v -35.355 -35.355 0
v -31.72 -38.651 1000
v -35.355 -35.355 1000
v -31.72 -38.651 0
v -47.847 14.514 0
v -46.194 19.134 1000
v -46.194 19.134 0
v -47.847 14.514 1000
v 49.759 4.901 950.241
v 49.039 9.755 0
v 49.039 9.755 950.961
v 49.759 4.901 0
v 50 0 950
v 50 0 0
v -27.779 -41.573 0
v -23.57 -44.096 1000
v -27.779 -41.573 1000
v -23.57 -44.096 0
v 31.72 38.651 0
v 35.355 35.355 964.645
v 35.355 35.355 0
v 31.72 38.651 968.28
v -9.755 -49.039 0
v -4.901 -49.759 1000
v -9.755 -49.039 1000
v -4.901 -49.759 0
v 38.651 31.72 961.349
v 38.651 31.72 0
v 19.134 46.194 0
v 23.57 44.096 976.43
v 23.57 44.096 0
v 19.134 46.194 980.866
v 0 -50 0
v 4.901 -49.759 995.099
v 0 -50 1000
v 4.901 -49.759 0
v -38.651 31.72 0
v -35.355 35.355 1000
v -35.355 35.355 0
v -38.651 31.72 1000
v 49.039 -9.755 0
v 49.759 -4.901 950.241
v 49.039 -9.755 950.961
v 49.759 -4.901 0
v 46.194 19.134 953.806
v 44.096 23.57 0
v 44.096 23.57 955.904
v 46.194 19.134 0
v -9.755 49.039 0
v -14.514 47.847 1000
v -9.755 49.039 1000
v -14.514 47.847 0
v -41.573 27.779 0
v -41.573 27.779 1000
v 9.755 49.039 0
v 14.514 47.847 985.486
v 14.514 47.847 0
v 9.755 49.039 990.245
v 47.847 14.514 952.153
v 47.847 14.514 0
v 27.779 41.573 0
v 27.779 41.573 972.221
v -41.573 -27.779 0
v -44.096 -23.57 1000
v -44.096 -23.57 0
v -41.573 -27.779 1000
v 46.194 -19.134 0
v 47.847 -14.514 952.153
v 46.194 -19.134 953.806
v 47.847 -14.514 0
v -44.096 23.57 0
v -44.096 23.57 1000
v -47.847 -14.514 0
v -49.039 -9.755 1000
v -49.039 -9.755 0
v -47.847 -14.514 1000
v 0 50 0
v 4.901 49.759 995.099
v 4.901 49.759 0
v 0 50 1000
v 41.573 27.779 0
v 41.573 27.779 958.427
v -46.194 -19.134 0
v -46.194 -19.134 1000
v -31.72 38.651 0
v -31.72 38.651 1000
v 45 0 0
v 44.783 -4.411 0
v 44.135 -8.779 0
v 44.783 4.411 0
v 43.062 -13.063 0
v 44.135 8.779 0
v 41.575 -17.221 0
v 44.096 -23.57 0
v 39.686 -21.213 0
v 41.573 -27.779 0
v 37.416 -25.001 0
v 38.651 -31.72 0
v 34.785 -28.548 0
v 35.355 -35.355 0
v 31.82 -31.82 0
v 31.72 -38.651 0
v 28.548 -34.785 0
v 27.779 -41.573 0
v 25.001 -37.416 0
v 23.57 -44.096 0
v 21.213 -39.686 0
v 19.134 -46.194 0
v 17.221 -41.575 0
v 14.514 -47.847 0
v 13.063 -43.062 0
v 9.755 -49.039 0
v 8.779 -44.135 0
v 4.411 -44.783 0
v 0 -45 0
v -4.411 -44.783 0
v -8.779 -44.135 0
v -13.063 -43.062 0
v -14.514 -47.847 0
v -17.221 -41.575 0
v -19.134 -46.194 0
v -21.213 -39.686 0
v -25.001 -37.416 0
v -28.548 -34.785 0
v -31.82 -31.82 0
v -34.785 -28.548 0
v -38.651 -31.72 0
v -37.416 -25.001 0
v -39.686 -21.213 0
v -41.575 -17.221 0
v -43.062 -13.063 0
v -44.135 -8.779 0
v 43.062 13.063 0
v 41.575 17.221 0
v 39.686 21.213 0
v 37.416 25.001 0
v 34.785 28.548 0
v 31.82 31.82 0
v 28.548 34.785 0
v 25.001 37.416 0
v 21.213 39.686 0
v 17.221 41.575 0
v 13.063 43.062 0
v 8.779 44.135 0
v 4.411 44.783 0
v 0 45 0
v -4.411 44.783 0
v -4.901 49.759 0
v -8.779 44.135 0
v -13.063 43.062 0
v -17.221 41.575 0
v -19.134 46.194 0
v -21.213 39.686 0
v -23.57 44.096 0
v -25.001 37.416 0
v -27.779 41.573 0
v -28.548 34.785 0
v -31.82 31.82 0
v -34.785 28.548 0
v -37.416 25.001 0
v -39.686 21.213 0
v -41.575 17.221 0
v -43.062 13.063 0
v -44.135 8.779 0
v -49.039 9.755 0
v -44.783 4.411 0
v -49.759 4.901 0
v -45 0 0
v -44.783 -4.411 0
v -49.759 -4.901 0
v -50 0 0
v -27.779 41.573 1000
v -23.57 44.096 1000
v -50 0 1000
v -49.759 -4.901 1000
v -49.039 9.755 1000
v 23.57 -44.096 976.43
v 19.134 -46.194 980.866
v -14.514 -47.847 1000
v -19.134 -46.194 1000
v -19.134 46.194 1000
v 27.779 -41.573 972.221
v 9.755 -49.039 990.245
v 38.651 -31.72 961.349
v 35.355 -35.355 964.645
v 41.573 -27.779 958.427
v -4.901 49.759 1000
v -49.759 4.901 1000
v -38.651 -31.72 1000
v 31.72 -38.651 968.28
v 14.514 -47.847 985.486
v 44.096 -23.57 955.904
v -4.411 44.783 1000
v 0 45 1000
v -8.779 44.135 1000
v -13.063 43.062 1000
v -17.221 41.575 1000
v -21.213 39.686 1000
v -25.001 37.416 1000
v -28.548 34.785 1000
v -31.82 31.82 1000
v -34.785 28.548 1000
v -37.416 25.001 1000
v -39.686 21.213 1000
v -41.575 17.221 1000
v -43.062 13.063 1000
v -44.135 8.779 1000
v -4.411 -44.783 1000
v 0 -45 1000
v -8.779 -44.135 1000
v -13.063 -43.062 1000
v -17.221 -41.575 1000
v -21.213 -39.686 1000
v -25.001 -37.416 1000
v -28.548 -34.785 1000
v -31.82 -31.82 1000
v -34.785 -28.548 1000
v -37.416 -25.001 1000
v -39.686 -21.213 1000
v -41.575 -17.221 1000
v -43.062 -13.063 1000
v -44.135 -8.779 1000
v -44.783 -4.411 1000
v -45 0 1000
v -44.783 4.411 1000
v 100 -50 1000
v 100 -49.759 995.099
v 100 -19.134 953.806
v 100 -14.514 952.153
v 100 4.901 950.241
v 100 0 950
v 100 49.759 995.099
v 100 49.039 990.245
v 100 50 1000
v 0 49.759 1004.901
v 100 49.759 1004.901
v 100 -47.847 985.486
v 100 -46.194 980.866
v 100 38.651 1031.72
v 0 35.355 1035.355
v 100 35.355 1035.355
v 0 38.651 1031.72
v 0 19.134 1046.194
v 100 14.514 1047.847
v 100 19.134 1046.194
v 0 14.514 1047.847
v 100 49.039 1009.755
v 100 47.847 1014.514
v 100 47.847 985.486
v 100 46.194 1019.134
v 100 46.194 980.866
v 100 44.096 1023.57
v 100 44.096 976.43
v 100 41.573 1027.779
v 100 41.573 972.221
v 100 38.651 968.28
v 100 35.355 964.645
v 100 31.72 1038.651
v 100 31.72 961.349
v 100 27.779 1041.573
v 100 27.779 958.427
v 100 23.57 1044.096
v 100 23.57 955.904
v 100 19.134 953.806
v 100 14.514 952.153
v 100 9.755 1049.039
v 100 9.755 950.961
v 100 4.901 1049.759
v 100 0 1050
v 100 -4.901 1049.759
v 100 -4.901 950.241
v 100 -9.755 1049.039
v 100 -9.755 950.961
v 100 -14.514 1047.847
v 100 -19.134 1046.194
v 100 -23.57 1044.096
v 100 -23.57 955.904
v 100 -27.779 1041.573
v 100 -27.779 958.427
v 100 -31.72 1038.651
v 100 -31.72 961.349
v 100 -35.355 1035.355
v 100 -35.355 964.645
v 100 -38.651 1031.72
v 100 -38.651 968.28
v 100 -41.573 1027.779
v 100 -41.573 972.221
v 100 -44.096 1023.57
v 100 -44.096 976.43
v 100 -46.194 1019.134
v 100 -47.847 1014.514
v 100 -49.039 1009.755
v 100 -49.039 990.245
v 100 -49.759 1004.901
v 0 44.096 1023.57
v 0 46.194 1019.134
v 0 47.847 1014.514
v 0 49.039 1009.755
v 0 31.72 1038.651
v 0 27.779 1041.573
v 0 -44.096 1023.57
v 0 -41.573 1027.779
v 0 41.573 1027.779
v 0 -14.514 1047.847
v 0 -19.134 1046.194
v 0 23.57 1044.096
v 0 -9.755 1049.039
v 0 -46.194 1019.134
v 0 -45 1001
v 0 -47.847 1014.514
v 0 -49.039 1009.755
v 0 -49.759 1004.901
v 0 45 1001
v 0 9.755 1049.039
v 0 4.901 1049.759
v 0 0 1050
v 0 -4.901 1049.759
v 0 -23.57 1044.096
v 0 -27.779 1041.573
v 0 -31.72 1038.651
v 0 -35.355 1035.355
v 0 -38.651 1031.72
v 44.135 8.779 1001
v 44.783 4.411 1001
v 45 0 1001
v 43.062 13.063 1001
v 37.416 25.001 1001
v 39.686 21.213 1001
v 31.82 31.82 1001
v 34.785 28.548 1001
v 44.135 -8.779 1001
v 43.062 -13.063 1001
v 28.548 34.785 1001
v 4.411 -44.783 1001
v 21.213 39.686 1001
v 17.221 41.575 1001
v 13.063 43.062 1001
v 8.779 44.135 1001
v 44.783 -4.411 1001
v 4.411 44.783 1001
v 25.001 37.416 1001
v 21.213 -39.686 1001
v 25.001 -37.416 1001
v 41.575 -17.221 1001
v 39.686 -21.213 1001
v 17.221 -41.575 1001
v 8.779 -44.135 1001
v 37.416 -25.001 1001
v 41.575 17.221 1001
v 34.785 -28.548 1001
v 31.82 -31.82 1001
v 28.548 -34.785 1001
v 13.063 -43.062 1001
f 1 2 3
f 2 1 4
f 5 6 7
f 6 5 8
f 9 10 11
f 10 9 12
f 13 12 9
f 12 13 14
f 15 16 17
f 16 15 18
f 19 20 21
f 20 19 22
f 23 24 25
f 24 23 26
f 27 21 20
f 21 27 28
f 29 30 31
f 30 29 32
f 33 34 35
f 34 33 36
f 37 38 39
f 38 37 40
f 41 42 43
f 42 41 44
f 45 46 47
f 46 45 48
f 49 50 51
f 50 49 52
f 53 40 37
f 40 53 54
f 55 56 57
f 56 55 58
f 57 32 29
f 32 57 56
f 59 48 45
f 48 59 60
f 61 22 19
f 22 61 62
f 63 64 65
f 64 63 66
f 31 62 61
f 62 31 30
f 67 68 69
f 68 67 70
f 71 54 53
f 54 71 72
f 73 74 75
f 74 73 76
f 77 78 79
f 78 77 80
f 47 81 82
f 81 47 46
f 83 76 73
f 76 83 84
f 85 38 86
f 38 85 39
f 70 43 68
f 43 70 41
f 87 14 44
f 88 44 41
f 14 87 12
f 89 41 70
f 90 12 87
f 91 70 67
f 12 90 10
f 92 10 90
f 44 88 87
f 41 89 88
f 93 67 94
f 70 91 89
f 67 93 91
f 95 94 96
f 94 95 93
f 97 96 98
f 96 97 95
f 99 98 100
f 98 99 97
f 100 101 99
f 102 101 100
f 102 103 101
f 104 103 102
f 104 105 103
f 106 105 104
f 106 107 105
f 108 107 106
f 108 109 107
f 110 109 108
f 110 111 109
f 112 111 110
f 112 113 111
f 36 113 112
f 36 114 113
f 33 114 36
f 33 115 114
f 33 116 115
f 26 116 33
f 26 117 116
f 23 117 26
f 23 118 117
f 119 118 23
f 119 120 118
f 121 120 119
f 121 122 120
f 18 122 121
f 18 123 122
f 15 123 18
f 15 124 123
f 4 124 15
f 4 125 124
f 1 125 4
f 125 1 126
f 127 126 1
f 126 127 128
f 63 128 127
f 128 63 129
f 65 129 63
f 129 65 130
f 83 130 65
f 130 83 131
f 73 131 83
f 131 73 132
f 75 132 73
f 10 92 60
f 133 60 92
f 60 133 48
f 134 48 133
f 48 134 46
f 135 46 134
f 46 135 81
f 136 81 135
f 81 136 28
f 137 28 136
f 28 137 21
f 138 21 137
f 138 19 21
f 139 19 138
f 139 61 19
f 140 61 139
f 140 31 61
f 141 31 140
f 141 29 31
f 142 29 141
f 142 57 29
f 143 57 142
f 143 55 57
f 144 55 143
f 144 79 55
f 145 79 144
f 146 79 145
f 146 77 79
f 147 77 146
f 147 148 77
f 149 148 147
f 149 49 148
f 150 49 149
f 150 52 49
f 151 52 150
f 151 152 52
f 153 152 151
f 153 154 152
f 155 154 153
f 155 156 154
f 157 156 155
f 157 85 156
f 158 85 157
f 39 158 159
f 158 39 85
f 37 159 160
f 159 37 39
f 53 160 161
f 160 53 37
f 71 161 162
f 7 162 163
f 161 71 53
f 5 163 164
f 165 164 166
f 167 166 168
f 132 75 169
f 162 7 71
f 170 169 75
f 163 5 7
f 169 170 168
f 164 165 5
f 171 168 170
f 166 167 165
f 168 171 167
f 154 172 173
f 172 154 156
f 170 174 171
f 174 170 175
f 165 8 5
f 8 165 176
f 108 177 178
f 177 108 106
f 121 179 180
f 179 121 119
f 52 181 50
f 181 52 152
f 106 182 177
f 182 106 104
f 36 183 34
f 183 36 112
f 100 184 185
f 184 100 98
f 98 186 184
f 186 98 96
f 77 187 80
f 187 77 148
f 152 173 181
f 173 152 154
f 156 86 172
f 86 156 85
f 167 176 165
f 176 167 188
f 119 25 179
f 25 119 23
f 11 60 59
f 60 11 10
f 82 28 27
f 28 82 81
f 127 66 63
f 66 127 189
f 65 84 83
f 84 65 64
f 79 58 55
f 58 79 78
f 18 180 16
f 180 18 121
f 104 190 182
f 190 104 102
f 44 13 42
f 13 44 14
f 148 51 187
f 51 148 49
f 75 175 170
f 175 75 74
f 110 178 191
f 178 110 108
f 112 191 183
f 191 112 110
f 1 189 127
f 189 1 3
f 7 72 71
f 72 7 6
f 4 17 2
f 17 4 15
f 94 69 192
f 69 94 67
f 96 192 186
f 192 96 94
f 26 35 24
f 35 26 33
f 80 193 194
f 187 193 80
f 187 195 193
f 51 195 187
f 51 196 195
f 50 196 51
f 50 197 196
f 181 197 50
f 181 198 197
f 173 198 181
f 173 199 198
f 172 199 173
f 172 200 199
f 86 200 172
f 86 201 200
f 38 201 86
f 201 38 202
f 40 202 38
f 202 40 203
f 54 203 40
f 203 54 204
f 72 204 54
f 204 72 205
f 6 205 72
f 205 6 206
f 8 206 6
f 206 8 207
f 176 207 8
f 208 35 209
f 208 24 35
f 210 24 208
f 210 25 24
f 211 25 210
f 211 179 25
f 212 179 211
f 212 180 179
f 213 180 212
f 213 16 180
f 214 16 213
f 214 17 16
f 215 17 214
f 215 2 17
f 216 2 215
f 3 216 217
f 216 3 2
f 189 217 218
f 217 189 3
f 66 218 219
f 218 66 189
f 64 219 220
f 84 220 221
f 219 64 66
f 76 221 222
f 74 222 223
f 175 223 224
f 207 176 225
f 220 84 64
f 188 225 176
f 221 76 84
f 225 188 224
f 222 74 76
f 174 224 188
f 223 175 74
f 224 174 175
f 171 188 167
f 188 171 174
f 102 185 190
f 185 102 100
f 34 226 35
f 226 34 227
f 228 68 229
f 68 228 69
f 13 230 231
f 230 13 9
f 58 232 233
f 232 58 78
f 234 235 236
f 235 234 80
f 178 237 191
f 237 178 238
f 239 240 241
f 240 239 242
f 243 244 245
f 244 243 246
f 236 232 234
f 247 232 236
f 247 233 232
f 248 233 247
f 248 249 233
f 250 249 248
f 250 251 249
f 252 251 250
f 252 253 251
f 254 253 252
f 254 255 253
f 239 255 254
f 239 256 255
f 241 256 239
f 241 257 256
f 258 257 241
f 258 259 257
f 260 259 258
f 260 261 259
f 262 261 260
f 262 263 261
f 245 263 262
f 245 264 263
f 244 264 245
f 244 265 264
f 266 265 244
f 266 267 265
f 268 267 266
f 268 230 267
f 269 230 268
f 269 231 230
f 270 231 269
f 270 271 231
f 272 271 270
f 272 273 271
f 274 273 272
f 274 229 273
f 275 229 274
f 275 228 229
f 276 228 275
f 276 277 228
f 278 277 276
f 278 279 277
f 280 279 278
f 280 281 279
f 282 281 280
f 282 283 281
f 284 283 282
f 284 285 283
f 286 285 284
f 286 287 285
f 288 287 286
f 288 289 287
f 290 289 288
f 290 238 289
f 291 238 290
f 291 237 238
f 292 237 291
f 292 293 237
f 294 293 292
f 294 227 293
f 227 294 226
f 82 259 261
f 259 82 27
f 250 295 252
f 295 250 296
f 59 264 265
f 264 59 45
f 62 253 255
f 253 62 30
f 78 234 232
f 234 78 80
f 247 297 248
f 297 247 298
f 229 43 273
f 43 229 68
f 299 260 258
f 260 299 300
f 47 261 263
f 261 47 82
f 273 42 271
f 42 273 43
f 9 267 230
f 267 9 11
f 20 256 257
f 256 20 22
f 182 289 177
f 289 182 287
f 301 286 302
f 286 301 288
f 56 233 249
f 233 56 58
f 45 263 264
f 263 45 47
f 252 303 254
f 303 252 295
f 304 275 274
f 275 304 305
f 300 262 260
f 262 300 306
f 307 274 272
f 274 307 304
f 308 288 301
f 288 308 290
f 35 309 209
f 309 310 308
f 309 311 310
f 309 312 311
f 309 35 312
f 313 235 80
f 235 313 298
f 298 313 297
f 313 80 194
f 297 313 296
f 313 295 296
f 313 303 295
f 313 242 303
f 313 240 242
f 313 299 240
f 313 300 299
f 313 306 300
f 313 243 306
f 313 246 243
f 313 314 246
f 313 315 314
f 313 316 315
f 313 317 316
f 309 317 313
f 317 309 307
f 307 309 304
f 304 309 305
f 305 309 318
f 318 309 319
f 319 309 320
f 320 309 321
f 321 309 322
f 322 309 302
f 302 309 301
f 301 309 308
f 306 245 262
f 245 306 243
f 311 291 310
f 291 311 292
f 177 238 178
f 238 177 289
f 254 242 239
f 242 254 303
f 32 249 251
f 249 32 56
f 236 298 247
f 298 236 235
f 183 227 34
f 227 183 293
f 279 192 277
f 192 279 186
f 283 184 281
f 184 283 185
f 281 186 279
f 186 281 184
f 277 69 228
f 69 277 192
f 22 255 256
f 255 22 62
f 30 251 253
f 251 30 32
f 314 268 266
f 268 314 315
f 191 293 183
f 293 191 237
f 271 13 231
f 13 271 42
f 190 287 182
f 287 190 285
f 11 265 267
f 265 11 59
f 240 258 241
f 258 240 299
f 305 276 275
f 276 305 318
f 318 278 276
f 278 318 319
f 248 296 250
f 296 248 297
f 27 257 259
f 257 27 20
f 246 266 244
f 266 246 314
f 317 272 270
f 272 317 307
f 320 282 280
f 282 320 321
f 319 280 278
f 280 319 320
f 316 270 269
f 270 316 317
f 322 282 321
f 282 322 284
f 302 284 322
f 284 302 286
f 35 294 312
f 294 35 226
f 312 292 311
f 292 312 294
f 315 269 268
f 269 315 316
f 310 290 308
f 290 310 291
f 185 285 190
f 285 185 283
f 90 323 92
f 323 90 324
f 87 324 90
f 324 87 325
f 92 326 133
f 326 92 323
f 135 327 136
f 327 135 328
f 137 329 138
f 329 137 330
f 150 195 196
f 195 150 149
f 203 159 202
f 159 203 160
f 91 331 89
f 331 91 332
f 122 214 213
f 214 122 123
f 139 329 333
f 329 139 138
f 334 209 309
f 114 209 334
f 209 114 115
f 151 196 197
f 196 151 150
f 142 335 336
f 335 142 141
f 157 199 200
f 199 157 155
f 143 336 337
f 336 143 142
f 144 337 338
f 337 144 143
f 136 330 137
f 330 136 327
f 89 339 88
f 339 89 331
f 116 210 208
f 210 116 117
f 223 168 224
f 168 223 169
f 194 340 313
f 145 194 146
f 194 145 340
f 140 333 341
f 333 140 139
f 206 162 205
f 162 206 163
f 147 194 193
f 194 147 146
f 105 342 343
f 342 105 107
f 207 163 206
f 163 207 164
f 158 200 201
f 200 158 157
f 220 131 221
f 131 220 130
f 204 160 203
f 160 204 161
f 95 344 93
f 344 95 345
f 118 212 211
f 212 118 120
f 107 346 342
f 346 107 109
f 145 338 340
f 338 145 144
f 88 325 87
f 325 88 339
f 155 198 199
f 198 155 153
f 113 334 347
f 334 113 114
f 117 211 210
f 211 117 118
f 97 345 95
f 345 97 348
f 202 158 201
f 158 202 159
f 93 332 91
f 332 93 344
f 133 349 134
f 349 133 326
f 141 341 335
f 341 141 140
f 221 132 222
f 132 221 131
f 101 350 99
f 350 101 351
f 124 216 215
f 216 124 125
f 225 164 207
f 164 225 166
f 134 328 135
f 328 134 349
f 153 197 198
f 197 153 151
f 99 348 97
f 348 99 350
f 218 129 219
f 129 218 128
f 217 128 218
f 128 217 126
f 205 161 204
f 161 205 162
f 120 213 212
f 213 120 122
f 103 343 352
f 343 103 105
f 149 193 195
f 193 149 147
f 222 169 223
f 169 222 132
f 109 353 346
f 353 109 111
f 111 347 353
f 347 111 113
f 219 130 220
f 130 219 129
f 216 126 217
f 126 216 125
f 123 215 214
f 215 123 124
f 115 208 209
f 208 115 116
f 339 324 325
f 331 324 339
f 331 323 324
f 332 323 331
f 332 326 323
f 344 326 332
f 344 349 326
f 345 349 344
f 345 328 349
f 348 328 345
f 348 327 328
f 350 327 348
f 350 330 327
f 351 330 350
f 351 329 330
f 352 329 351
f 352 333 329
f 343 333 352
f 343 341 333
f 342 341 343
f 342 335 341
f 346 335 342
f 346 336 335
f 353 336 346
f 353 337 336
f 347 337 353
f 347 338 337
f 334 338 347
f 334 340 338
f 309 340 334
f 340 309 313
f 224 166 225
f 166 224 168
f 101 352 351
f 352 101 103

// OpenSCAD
module ht_pipe() {
    difference() {
        union() {
            cylinder(h=1000, r=50, $fn=64);
            translate([0, 0, 1000])
                rotate([0, 90, 0])
                cylinder(h=100, r=50, $fn=64);
        }
        translate([0, 0, -1])
            cylinder(h=1002, r=45, $fn=64);
    }
}

ht_pipe();
